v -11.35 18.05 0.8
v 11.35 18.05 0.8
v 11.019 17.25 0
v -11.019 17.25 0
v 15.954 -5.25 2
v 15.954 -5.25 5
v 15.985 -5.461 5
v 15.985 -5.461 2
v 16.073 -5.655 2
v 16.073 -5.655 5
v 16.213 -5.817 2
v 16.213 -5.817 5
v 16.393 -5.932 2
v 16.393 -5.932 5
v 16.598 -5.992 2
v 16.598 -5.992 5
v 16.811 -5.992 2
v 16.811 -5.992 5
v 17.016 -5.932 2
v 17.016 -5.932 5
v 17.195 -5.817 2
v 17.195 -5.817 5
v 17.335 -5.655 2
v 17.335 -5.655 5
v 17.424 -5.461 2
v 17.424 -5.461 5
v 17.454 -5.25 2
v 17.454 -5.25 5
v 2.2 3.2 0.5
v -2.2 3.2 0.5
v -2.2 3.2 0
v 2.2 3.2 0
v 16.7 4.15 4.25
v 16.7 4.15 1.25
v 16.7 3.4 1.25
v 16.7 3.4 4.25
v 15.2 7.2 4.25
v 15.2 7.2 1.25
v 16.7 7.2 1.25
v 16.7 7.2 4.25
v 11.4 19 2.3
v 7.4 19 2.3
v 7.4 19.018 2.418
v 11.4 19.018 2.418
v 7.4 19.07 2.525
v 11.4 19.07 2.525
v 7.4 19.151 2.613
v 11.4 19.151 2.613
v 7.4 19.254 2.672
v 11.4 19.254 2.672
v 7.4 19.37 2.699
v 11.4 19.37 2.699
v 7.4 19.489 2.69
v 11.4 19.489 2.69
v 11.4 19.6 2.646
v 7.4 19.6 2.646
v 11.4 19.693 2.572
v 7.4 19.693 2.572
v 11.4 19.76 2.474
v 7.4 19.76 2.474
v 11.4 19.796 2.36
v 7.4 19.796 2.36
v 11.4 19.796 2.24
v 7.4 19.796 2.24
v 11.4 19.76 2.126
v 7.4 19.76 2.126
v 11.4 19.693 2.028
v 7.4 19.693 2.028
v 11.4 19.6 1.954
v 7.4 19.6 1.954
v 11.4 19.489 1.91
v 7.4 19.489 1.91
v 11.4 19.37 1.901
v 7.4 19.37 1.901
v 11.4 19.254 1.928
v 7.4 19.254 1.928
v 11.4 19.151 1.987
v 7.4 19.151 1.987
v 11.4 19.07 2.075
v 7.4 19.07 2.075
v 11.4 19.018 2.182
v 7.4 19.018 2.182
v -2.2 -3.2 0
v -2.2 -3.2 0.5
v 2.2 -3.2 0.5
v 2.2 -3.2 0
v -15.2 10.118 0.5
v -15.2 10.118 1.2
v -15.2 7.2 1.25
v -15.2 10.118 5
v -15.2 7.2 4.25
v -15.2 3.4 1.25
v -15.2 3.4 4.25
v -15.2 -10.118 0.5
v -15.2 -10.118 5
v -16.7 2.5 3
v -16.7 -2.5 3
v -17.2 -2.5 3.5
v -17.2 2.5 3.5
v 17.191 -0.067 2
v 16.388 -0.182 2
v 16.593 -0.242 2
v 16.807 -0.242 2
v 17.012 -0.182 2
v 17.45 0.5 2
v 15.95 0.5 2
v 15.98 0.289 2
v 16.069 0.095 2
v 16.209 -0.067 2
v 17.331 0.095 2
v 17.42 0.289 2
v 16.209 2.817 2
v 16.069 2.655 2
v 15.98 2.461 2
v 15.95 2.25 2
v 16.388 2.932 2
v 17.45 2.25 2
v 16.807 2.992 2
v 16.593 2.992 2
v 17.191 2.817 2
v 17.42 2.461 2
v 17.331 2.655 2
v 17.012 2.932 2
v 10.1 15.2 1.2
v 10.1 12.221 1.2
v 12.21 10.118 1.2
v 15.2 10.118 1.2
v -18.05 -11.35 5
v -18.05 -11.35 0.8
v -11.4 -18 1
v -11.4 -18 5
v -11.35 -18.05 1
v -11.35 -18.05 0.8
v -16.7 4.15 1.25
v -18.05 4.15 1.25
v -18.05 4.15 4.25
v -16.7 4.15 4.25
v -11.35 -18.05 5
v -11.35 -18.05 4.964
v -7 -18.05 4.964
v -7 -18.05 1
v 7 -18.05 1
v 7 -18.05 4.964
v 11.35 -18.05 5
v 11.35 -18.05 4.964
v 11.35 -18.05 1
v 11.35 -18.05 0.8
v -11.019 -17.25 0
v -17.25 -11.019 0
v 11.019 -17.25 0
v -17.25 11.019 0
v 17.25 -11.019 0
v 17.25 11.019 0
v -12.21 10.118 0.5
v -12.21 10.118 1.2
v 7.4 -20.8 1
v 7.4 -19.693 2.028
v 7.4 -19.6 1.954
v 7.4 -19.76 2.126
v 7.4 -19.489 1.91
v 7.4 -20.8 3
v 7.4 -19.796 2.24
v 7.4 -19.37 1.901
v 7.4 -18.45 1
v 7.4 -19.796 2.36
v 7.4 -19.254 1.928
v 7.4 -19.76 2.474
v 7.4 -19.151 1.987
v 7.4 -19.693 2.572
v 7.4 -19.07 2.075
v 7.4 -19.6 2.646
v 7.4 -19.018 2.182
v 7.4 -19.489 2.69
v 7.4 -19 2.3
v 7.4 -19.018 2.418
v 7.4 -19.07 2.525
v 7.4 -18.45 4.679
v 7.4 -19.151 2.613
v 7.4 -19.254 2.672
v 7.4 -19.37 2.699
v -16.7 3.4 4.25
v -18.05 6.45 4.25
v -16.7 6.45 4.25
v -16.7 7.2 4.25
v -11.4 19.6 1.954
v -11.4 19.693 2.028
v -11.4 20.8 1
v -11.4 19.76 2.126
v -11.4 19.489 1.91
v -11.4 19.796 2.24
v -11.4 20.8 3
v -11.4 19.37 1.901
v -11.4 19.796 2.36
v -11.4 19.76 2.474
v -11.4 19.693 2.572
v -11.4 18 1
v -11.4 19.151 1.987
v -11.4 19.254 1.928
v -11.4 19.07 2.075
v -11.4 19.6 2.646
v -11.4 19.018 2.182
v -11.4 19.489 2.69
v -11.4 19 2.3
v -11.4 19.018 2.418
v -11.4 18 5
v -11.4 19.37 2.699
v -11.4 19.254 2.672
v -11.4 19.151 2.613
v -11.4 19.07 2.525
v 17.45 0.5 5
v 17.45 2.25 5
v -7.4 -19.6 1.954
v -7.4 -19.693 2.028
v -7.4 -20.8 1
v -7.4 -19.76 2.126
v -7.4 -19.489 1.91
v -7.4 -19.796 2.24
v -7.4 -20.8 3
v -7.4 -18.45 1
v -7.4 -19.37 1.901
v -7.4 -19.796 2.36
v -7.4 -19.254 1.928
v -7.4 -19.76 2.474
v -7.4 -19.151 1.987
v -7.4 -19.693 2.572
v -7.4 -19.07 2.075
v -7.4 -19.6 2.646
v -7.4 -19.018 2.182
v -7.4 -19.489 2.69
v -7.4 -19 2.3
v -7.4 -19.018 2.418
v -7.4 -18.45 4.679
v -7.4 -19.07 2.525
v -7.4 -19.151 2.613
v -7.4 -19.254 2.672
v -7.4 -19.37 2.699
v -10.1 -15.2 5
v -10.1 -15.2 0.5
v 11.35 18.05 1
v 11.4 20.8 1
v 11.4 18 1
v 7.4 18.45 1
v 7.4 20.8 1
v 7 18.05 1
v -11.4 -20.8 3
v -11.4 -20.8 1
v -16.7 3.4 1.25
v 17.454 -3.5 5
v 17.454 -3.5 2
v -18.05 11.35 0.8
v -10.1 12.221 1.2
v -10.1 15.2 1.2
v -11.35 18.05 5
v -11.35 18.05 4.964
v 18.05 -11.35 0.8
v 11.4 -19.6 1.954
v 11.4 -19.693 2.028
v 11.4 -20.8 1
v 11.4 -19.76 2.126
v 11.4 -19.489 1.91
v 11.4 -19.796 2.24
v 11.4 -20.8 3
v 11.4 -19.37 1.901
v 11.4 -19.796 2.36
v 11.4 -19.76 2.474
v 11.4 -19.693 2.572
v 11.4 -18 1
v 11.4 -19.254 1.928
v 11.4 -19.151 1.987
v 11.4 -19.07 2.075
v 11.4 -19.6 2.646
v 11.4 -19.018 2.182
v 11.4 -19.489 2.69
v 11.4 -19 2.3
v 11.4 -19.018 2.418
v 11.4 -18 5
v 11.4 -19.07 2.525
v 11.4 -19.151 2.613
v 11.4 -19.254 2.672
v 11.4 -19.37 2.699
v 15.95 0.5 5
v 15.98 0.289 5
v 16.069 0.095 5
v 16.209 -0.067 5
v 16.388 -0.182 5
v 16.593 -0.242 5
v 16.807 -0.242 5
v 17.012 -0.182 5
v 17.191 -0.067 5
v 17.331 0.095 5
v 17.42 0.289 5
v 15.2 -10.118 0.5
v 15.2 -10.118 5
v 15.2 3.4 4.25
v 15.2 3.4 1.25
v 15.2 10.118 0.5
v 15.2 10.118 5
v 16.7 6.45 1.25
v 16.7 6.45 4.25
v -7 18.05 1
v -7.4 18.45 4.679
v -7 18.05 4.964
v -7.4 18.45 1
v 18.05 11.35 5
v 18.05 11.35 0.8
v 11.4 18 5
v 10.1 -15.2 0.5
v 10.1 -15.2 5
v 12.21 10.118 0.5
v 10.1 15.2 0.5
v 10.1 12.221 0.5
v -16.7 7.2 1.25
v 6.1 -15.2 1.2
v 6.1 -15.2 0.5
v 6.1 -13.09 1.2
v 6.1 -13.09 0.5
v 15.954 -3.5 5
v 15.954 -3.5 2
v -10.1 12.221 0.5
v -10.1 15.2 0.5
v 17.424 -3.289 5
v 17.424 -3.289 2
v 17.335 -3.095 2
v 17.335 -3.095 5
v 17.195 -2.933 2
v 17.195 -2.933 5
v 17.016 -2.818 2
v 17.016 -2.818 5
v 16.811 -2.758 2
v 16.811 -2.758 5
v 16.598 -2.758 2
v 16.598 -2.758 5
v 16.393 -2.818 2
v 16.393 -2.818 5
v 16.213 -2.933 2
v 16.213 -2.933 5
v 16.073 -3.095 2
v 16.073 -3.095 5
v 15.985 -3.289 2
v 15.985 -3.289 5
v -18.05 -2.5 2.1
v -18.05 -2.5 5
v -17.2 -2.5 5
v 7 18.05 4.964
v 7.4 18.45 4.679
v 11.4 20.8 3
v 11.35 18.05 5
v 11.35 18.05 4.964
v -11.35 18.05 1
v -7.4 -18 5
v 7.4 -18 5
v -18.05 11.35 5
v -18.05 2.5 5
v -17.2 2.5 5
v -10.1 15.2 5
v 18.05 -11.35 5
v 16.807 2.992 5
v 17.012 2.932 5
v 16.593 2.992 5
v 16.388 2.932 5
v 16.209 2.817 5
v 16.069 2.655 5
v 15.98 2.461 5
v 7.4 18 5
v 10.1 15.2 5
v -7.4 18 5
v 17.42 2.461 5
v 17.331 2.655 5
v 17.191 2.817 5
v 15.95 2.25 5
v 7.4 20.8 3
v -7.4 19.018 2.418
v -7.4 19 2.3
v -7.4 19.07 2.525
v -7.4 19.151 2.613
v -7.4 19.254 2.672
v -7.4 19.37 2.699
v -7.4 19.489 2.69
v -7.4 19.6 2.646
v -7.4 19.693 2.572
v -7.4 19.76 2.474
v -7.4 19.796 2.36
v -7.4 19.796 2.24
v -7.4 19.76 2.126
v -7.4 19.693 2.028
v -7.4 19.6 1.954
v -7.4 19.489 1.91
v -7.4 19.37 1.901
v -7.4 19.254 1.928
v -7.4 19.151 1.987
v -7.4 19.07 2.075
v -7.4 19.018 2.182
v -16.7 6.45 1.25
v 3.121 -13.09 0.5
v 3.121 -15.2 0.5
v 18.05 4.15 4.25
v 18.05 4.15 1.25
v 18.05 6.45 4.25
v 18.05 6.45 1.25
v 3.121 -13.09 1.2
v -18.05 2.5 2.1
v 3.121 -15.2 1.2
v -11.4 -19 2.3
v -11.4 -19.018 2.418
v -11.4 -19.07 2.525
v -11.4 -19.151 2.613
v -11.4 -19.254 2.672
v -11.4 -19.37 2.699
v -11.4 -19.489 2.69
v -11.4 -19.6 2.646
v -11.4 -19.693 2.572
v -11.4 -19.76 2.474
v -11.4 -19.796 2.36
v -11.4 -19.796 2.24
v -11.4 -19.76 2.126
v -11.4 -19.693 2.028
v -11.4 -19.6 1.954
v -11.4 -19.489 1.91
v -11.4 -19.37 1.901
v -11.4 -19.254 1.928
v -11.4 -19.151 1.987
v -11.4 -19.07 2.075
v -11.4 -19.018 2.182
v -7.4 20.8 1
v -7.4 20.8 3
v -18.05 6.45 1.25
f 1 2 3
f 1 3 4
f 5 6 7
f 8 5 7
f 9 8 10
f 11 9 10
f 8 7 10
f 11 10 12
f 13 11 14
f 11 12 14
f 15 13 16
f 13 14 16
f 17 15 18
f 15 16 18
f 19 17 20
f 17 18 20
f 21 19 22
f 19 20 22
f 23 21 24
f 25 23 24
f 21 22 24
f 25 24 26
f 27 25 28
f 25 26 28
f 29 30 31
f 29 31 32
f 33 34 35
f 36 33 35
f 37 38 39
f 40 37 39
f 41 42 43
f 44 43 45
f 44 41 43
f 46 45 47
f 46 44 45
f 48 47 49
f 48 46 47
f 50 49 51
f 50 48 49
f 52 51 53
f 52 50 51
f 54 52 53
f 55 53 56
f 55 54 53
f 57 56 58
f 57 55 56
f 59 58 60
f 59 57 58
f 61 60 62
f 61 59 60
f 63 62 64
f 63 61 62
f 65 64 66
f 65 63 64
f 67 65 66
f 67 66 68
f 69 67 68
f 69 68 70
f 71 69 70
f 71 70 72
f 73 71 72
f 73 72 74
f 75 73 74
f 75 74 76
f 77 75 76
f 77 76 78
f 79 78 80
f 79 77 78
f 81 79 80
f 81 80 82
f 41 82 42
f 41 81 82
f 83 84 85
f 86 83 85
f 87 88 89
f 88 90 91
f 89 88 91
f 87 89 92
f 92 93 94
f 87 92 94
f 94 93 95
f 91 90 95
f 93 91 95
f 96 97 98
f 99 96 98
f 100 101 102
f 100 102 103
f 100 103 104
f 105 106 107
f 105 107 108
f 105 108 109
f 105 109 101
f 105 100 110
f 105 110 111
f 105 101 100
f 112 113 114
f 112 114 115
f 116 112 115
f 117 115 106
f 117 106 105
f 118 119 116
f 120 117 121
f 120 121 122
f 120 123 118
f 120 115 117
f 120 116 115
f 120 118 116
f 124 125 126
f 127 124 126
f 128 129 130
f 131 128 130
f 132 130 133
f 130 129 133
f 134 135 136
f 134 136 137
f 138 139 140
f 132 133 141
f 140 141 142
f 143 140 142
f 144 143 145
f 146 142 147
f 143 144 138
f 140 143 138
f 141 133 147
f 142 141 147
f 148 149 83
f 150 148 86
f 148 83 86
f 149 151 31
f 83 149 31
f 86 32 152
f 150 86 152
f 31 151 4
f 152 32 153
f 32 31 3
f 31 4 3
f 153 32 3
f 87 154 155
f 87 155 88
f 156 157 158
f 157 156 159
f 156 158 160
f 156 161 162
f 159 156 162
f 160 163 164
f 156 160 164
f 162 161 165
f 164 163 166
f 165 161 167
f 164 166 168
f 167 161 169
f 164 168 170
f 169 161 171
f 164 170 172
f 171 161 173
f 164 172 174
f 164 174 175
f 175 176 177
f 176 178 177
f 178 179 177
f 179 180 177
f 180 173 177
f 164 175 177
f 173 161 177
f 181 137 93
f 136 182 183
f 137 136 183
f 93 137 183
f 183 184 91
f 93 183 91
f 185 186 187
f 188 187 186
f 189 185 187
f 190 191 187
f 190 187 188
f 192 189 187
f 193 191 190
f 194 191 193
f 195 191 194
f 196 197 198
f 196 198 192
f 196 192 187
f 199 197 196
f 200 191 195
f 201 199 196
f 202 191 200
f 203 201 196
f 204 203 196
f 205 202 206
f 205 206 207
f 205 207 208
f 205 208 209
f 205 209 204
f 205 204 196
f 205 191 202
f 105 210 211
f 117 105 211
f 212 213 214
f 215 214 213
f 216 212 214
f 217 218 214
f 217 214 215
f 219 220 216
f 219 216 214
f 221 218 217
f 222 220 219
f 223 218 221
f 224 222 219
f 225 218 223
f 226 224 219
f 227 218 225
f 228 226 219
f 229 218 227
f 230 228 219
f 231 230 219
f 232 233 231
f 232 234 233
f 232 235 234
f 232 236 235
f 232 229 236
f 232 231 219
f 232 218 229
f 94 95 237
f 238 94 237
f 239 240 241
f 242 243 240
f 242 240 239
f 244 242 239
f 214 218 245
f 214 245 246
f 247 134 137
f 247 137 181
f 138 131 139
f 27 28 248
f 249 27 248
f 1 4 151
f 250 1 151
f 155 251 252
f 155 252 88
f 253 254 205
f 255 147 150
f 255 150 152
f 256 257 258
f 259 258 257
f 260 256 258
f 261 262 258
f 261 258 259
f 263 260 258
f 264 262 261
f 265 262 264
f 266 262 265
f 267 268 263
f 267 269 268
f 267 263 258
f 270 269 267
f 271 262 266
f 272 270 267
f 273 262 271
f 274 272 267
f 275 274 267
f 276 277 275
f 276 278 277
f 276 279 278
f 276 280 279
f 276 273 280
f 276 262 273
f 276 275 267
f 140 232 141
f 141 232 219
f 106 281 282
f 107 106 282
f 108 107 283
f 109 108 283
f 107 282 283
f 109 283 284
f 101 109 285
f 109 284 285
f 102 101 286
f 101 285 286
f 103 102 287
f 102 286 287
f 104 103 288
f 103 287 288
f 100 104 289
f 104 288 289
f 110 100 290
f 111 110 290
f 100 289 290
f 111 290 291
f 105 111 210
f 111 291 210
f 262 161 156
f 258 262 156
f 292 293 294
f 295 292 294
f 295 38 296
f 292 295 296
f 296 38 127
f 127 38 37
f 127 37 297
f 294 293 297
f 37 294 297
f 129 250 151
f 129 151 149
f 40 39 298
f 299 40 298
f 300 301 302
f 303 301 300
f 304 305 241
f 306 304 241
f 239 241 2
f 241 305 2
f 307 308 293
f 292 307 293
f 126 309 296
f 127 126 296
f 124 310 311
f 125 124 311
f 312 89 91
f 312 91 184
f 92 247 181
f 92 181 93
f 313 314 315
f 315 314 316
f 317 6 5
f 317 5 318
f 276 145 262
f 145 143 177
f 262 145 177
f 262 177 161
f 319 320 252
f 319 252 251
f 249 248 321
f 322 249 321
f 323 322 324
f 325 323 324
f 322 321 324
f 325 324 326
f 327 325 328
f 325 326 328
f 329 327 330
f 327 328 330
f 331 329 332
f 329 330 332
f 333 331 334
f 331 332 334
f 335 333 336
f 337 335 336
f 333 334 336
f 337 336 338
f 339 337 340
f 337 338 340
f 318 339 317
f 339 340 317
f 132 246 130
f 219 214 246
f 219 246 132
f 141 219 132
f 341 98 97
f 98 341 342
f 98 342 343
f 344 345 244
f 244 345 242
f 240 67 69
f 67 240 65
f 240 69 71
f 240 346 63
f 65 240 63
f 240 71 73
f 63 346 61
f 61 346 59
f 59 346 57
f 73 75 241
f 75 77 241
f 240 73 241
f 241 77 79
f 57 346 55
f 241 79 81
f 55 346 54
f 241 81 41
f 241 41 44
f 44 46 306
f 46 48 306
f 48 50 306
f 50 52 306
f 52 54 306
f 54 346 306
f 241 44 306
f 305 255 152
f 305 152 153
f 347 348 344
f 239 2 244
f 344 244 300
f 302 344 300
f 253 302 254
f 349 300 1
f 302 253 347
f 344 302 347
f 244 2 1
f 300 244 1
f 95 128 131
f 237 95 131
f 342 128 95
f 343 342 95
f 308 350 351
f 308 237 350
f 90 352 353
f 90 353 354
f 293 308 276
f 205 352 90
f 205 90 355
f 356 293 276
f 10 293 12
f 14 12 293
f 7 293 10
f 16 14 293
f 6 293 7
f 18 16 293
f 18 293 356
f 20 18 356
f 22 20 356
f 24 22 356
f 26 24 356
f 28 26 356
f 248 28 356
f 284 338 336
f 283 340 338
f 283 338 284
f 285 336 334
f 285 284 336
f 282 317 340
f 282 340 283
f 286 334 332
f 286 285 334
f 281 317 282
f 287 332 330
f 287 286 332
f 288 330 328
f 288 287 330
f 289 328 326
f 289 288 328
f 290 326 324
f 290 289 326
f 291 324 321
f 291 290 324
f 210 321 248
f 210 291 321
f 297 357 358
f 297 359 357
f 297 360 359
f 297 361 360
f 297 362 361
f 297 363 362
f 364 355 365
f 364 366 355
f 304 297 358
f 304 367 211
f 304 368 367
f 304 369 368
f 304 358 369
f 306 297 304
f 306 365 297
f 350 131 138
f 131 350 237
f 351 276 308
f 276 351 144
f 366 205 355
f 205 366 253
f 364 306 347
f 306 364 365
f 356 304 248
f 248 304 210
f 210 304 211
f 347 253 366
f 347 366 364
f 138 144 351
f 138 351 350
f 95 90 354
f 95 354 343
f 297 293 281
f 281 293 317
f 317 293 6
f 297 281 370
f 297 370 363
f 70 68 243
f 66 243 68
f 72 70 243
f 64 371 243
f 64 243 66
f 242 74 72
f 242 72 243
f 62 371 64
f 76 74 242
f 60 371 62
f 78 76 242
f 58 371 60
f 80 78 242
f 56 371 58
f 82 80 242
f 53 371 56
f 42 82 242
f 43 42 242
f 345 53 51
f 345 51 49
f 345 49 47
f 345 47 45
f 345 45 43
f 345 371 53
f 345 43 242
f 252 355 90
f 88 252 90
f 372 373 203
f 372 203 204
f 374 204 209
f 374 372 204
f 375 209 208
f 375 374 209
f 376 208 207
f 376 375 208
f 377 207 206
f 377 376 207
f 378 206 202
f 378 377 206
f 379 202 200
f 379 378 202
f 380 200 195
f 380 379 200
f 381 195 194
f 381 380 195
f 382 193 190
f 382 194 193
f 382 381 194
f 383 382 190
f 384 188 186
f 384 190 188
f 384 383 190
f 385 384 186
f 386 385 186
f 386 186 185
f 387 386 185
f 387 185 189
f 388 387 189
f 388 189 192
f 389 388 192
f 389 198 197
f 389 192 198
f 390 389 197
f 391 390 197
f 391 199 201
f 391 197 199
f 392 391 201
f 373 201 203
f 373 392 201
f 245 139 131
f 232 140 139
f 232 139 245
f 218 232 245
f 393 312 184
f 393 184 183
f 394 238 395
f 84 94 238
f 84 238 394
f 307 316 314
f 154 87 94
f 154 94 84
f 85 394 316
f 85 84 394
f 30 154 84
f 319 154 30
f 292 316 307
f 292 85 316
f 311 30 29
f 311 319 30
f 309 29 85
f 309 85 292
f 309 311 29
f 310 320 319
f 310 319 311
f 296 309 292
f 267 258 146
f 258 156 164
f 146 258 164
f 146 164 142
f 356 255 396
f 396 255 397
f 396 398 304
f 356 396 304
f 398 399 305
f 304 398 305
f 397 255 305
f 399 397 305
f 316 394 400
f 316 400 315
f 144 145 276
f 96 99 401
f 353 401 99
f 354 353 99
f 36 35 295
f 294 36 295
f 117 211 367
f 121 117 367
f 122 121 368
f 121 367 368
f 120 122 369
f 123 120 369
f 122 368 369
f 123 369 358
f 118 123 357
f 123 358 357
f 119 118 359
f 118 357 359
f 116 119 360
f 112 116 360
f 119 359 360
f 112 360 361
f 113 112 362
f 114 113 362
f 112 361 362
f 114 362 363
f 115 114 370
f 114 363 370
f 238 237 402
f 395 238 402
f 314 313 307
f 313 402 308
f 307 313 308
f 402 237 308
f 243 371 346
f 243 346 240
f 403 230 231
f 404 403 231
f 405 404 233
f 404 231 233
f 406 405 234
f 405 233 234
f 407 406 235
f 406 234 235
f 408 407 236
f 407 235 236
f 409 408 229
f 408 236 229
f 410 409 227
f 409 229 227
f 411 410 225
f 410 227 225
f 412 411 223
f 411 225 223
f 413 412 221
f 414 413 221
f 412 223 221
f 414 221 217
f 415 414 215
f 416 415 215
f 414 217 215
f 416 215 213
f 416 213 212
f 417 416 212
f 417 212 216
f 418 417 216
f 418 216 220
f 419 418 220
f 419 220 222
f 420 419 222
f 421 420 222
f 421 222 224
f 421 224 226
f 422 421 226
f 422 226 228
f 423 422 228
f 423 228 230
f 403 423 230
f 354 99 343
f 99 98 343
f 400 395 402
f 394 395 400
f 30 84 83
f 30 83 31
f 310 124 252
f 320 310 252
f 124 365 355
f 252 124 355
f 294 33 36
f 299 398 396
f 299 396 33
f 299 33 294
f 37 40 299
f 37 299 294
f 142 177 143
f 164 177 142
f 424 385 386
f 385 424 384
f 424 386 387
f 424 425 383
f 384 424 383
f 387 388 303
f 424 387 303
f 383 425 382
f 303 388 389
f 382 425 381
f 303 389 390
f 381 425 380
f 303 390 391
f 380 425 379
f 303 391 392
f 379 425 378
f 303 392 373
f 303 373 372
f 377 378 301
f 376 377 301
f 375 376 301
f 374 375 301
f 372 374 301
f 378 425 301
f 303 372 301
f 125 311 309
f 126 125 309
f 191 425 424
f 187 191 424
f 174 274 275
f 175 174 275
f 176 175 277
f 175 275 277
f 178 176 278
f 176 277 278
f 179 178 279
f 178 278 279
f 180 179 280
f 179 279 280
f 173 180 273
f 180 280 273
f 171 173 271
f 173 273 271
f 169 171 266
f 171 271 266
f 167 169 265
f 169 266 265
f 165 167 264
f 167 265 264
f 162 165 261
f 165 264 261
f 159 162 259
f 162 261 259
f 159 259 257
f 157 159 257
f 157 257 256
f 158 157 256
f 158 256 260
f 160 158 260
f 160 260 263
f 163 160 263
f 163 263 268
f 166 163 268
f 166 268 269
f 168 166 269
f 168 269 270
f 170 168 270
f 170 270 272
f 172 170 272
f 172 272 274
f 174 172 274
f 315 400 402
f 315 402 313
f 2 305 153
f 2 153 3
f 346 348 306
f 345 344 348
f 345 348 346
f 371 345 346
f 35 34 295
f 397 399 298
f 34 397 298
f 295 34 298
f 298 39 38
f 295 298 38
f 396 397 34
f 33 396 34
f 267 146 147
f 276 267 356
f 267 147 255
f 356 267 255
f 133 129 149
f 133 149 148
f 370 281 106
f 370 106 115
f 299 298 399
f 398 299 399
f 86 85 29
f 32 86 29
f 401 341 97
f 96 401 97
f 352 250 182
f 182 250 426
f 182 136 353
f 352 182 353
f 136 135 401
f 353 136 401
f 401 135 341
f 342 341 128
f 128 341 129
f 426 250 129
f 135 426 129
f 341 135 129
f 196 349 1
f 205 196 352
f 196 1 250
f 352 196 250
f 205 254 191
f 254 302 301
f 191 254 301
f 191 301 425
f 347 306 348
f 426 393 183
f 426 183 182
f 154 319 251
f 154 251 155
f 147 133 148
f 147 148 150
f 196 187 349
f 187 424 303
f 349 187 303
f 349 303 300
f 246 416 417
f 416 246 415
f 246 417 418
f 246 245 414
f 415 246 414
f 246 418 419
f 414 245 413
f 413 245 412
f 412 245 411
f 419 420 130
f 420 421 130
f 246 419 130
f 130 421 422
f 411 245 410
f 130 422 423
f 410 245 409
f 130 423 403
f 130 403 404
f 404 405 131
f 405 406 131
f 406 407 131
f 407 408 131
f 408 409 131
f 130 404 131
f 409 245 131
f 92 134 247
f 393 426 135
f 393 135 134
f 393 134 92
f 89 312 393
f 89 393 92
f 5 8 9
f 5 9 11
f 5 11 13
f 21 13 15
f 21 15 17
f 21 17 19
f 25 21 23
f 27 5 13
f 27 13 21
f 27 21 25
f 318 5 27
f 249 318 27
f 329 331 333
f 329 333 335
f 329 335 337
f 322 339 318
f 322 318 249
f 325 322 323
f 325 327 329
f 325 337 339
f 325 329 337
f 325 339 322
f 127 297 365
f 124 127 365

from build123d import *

# Parameters (mm, degrees)
PAD_DEPTH               = 5
POCKET_DEPTH            = 4.5
POCKET001_DEPTH         = 3
SKETCH005_W             = 2.9792998166
SKETCH005_H             = 2.1103373701
PAD001_DEPTH            = 0.7
POCKET002_DEPTH         = 2.5
POCKET003_DEPTH         = 3
PAD002_DEPTH            = 4
PAD002_MIRRORED_2_DEPTH = 4
SKETCH014_R             = 0.4
POCKET004_DEPTH         = 140.0632958807
SKETCH003_W             = 4.4
SKETCH003_H             = 6.4
POCKET005_DEPTH         = 0.501
CHAMFER_SIZE            = 0.8
CHAMFER001_SIZE         = 0.4


with BuildPart() as part:
    # Sketch001 → Pad (new body)
    with BuildSketch(Plane.XY):
        Polygon((18.05, 11.35), (11.35, 18.05), (-11.35, 18.05), (-18.05, 11.35), (-18.05, -11.35), (-11.35, -18.05), (11.35, -18.05), (18.05, -11.35), align=None)
    extrude(amount=PAD_DEPTH)

    # Sketch (on Face10 of Pad) → Pocket (cut)
    with BuildSketch(Plane.XY.offset(5)):
        Polygon((-15.2, 10.1176776962), (-15.2, -10.1176776962), (-10.1, -15.2), (10.1, -15.2), (15.2, -10.1176776962), (15.2, 10.1176776962), (10.1, 15.2), (-10.1, 15.2), align=None)
    extrude(amount=-POCKET_DEPTH, mode=Mode.SUBTRACT)

    # Sketch004 (on Face19 of Pocket) → Pocket001 (cut)
    with BuildSketch(Plane.XY.offset(1.25)):
        Polygon((15.2, 3.4), (15.2, 7.2), (16.7, 7.2), (16.7, 6.45), (18.2, 6.45), (18.2, 4.15), (16.7, 4.15), (16.7, 3.4), align=None)
        Polygon((-15.2, 3.4), (-15.2, 7.2), (-16.7, 7.2), (-16.7, 6.45), (-18.2, 6.45), (-18.2, 4.15), (-16.7, 4.15), (-16.7, 3.4), align=None)
    extrude(amount=POCKET001_DEPTH, mode=Mode.SUBTRACT)

    # Sketch005 (on Face31 of Pocket001) → Pad001 (join)
    with BuildSketch(Plane.XY.offset(0.5)):
        Polygon((-10.1, 15.2), (-10.1, 12.2207001834), (-12.2103373701, 10.1176776962), (-15.2, 10.1176776962), align=None)
        Polygon((12.2103373701, 10.1176776962), (15.2, 10.1176776962), (10.1, 15.2), (10.1, 12.2207001834), align=None)
        with Locations((4.6103500917, -14.1448313149)):
            Rectangle(SKETCH005_W, SKETCH005_H)
    extrude(amount=PAD001_DEPTH)

    # Sketch006 → Pocket002 (cut, symmetric)
    with BuildSketch(Plane.XZ):
        Polygon((-18.2, 5), (-18.2, 2), (-16.7, 3), (-17.2, 3.5), (-17.2, 5), align=None)
    extrude(amount=POCKET002_DEPTH, both=True, mode=Mode.SUBTRACT)

    # Sketch007 → Pocket003 (cut)
    with BuildSketch(Plane.XY.offset(5)):
        with BuildLine():
            ThreePointArc((15.95, 0.5), (16.7, -0.25), (17.45, 0.5))
            Line((17.45, 0.5), (17.45, 2.25))
            ThreePointArc((17.45, 2.25), (16.7000041345, 3.0000082691), (15.95, 2.2500082691))
            Line((15.95, 0.5), (15.95, 2.2500082691))
        make_face()
        with BuildLine():
            ThreePointArc((15.9543057832, -5.2499990728), (16.7043057832, -5.9999990728), (17.4543057832, -5.2499990728))
            Line((17.4543057832, -5.2499990728), (17.4543057832, -3.4999990728))
            ThreePointArc((17.4543057832, -3.4999990728), (16.7043053195, -2.75), (15.9543057832, -3.5))
            Line((15.9543057832, -5.2499990728), (15.9543057832, -3.5))
        make_face()
    extrude(amount=-POCKET003_DEPTH, mode=Mode.SUBTRACT)

    # Sketch008 → Pad002 (join)
    with BuildSketch(Plane.YZ.offset(7.4)):
        Polygon((-18, 1), (-18, 5), (-20.8, 3), (-20.8, 1), align=None)
    pad002 = extrude(amount=PAD002_DEPTH)

    # Sketch008 Mirrored 2 → Pad002 Mirrored 2 (add)
    with BuildSketch(Plane(origin=(7.4, 0, 0), x_dir=(0, -1, 0), z_dir=(-1, 0, 0))):
        Polygon((-18, 1), (-18, 5), (-20.8, 3), (-20.8, 1), align=None)
    pad002_mirrored_2 = extrude(amount=-PAD002_MIRRORED_2_DEPTH)

    # Mirrored001: Pad002, Pad002 Mirrored 2 across YZ
    add(pad002.mirror(Plane.YZ))
    add(pad002_mirrored_2.mirror(Plane.YZ))

    # Sketch014 (on Face59 of MultiTransform) → Pocket004 (cut, through all)
    with BuildSketch(Plane.YZ.offset(11.4)):
        with Locations((-19.4, 2.3)):
            Circle(SKETCH014_R)
    pocket004 = extrude(amount=-POCKET004_DEPTH, mode=Mode.SUBTRACT)

    # Mirrored002: Pocket004 across Sketch014 V_Axis
    add(pocket004.mirror(Plane(origin=(11.4, 0, 0), x_dir=(1, 0, 0), z_dir=(0, 1, 0))), mode=Mode.SUBTRACT)

    # Sketch003 (on Face67 of Mirrored002) → Pocket005 (cut, through all)
    with BuildSketch(Plane.XY.offset(0.5)):
        Rectangle(SKETCH003_W, SKETCH003_H)
    extrude(amount=-POCKET005_DEPTH, mode=Mode.SUBTRACT)

    # Chamfer
    chamfer_edges = [part.edges().sort_by_distance(p)[0] for p in [
        (-14.7, -14.7, 0),
        (-18.05, 0, 0),
        (0, 18.05, 0),
        (-14.7, 14.7, 0),
        (14.7, 14.7, 0),
        (18.05, 0, 0),
        (14.7, -14.7, 0),
        (0, -18.05, 0),
    ]]
    chamfer(chamfer_edges, length=CHAMFER_SIZE)

    # Chamfer001
    chamfer001_edges = [part.edges().sort_by_distance(p)[0] for p in [
        (7.4, 18.05, 2.982143),
        (-7.4, 18.05, 2.982143),
        (-7.4, -18.05, 2.982143),
        (7.4, -18.05, 2.982143),
    ]]
    chamfer(chamfer001_edges, length=CHAMFER001_SIZE)


solid = part.part
